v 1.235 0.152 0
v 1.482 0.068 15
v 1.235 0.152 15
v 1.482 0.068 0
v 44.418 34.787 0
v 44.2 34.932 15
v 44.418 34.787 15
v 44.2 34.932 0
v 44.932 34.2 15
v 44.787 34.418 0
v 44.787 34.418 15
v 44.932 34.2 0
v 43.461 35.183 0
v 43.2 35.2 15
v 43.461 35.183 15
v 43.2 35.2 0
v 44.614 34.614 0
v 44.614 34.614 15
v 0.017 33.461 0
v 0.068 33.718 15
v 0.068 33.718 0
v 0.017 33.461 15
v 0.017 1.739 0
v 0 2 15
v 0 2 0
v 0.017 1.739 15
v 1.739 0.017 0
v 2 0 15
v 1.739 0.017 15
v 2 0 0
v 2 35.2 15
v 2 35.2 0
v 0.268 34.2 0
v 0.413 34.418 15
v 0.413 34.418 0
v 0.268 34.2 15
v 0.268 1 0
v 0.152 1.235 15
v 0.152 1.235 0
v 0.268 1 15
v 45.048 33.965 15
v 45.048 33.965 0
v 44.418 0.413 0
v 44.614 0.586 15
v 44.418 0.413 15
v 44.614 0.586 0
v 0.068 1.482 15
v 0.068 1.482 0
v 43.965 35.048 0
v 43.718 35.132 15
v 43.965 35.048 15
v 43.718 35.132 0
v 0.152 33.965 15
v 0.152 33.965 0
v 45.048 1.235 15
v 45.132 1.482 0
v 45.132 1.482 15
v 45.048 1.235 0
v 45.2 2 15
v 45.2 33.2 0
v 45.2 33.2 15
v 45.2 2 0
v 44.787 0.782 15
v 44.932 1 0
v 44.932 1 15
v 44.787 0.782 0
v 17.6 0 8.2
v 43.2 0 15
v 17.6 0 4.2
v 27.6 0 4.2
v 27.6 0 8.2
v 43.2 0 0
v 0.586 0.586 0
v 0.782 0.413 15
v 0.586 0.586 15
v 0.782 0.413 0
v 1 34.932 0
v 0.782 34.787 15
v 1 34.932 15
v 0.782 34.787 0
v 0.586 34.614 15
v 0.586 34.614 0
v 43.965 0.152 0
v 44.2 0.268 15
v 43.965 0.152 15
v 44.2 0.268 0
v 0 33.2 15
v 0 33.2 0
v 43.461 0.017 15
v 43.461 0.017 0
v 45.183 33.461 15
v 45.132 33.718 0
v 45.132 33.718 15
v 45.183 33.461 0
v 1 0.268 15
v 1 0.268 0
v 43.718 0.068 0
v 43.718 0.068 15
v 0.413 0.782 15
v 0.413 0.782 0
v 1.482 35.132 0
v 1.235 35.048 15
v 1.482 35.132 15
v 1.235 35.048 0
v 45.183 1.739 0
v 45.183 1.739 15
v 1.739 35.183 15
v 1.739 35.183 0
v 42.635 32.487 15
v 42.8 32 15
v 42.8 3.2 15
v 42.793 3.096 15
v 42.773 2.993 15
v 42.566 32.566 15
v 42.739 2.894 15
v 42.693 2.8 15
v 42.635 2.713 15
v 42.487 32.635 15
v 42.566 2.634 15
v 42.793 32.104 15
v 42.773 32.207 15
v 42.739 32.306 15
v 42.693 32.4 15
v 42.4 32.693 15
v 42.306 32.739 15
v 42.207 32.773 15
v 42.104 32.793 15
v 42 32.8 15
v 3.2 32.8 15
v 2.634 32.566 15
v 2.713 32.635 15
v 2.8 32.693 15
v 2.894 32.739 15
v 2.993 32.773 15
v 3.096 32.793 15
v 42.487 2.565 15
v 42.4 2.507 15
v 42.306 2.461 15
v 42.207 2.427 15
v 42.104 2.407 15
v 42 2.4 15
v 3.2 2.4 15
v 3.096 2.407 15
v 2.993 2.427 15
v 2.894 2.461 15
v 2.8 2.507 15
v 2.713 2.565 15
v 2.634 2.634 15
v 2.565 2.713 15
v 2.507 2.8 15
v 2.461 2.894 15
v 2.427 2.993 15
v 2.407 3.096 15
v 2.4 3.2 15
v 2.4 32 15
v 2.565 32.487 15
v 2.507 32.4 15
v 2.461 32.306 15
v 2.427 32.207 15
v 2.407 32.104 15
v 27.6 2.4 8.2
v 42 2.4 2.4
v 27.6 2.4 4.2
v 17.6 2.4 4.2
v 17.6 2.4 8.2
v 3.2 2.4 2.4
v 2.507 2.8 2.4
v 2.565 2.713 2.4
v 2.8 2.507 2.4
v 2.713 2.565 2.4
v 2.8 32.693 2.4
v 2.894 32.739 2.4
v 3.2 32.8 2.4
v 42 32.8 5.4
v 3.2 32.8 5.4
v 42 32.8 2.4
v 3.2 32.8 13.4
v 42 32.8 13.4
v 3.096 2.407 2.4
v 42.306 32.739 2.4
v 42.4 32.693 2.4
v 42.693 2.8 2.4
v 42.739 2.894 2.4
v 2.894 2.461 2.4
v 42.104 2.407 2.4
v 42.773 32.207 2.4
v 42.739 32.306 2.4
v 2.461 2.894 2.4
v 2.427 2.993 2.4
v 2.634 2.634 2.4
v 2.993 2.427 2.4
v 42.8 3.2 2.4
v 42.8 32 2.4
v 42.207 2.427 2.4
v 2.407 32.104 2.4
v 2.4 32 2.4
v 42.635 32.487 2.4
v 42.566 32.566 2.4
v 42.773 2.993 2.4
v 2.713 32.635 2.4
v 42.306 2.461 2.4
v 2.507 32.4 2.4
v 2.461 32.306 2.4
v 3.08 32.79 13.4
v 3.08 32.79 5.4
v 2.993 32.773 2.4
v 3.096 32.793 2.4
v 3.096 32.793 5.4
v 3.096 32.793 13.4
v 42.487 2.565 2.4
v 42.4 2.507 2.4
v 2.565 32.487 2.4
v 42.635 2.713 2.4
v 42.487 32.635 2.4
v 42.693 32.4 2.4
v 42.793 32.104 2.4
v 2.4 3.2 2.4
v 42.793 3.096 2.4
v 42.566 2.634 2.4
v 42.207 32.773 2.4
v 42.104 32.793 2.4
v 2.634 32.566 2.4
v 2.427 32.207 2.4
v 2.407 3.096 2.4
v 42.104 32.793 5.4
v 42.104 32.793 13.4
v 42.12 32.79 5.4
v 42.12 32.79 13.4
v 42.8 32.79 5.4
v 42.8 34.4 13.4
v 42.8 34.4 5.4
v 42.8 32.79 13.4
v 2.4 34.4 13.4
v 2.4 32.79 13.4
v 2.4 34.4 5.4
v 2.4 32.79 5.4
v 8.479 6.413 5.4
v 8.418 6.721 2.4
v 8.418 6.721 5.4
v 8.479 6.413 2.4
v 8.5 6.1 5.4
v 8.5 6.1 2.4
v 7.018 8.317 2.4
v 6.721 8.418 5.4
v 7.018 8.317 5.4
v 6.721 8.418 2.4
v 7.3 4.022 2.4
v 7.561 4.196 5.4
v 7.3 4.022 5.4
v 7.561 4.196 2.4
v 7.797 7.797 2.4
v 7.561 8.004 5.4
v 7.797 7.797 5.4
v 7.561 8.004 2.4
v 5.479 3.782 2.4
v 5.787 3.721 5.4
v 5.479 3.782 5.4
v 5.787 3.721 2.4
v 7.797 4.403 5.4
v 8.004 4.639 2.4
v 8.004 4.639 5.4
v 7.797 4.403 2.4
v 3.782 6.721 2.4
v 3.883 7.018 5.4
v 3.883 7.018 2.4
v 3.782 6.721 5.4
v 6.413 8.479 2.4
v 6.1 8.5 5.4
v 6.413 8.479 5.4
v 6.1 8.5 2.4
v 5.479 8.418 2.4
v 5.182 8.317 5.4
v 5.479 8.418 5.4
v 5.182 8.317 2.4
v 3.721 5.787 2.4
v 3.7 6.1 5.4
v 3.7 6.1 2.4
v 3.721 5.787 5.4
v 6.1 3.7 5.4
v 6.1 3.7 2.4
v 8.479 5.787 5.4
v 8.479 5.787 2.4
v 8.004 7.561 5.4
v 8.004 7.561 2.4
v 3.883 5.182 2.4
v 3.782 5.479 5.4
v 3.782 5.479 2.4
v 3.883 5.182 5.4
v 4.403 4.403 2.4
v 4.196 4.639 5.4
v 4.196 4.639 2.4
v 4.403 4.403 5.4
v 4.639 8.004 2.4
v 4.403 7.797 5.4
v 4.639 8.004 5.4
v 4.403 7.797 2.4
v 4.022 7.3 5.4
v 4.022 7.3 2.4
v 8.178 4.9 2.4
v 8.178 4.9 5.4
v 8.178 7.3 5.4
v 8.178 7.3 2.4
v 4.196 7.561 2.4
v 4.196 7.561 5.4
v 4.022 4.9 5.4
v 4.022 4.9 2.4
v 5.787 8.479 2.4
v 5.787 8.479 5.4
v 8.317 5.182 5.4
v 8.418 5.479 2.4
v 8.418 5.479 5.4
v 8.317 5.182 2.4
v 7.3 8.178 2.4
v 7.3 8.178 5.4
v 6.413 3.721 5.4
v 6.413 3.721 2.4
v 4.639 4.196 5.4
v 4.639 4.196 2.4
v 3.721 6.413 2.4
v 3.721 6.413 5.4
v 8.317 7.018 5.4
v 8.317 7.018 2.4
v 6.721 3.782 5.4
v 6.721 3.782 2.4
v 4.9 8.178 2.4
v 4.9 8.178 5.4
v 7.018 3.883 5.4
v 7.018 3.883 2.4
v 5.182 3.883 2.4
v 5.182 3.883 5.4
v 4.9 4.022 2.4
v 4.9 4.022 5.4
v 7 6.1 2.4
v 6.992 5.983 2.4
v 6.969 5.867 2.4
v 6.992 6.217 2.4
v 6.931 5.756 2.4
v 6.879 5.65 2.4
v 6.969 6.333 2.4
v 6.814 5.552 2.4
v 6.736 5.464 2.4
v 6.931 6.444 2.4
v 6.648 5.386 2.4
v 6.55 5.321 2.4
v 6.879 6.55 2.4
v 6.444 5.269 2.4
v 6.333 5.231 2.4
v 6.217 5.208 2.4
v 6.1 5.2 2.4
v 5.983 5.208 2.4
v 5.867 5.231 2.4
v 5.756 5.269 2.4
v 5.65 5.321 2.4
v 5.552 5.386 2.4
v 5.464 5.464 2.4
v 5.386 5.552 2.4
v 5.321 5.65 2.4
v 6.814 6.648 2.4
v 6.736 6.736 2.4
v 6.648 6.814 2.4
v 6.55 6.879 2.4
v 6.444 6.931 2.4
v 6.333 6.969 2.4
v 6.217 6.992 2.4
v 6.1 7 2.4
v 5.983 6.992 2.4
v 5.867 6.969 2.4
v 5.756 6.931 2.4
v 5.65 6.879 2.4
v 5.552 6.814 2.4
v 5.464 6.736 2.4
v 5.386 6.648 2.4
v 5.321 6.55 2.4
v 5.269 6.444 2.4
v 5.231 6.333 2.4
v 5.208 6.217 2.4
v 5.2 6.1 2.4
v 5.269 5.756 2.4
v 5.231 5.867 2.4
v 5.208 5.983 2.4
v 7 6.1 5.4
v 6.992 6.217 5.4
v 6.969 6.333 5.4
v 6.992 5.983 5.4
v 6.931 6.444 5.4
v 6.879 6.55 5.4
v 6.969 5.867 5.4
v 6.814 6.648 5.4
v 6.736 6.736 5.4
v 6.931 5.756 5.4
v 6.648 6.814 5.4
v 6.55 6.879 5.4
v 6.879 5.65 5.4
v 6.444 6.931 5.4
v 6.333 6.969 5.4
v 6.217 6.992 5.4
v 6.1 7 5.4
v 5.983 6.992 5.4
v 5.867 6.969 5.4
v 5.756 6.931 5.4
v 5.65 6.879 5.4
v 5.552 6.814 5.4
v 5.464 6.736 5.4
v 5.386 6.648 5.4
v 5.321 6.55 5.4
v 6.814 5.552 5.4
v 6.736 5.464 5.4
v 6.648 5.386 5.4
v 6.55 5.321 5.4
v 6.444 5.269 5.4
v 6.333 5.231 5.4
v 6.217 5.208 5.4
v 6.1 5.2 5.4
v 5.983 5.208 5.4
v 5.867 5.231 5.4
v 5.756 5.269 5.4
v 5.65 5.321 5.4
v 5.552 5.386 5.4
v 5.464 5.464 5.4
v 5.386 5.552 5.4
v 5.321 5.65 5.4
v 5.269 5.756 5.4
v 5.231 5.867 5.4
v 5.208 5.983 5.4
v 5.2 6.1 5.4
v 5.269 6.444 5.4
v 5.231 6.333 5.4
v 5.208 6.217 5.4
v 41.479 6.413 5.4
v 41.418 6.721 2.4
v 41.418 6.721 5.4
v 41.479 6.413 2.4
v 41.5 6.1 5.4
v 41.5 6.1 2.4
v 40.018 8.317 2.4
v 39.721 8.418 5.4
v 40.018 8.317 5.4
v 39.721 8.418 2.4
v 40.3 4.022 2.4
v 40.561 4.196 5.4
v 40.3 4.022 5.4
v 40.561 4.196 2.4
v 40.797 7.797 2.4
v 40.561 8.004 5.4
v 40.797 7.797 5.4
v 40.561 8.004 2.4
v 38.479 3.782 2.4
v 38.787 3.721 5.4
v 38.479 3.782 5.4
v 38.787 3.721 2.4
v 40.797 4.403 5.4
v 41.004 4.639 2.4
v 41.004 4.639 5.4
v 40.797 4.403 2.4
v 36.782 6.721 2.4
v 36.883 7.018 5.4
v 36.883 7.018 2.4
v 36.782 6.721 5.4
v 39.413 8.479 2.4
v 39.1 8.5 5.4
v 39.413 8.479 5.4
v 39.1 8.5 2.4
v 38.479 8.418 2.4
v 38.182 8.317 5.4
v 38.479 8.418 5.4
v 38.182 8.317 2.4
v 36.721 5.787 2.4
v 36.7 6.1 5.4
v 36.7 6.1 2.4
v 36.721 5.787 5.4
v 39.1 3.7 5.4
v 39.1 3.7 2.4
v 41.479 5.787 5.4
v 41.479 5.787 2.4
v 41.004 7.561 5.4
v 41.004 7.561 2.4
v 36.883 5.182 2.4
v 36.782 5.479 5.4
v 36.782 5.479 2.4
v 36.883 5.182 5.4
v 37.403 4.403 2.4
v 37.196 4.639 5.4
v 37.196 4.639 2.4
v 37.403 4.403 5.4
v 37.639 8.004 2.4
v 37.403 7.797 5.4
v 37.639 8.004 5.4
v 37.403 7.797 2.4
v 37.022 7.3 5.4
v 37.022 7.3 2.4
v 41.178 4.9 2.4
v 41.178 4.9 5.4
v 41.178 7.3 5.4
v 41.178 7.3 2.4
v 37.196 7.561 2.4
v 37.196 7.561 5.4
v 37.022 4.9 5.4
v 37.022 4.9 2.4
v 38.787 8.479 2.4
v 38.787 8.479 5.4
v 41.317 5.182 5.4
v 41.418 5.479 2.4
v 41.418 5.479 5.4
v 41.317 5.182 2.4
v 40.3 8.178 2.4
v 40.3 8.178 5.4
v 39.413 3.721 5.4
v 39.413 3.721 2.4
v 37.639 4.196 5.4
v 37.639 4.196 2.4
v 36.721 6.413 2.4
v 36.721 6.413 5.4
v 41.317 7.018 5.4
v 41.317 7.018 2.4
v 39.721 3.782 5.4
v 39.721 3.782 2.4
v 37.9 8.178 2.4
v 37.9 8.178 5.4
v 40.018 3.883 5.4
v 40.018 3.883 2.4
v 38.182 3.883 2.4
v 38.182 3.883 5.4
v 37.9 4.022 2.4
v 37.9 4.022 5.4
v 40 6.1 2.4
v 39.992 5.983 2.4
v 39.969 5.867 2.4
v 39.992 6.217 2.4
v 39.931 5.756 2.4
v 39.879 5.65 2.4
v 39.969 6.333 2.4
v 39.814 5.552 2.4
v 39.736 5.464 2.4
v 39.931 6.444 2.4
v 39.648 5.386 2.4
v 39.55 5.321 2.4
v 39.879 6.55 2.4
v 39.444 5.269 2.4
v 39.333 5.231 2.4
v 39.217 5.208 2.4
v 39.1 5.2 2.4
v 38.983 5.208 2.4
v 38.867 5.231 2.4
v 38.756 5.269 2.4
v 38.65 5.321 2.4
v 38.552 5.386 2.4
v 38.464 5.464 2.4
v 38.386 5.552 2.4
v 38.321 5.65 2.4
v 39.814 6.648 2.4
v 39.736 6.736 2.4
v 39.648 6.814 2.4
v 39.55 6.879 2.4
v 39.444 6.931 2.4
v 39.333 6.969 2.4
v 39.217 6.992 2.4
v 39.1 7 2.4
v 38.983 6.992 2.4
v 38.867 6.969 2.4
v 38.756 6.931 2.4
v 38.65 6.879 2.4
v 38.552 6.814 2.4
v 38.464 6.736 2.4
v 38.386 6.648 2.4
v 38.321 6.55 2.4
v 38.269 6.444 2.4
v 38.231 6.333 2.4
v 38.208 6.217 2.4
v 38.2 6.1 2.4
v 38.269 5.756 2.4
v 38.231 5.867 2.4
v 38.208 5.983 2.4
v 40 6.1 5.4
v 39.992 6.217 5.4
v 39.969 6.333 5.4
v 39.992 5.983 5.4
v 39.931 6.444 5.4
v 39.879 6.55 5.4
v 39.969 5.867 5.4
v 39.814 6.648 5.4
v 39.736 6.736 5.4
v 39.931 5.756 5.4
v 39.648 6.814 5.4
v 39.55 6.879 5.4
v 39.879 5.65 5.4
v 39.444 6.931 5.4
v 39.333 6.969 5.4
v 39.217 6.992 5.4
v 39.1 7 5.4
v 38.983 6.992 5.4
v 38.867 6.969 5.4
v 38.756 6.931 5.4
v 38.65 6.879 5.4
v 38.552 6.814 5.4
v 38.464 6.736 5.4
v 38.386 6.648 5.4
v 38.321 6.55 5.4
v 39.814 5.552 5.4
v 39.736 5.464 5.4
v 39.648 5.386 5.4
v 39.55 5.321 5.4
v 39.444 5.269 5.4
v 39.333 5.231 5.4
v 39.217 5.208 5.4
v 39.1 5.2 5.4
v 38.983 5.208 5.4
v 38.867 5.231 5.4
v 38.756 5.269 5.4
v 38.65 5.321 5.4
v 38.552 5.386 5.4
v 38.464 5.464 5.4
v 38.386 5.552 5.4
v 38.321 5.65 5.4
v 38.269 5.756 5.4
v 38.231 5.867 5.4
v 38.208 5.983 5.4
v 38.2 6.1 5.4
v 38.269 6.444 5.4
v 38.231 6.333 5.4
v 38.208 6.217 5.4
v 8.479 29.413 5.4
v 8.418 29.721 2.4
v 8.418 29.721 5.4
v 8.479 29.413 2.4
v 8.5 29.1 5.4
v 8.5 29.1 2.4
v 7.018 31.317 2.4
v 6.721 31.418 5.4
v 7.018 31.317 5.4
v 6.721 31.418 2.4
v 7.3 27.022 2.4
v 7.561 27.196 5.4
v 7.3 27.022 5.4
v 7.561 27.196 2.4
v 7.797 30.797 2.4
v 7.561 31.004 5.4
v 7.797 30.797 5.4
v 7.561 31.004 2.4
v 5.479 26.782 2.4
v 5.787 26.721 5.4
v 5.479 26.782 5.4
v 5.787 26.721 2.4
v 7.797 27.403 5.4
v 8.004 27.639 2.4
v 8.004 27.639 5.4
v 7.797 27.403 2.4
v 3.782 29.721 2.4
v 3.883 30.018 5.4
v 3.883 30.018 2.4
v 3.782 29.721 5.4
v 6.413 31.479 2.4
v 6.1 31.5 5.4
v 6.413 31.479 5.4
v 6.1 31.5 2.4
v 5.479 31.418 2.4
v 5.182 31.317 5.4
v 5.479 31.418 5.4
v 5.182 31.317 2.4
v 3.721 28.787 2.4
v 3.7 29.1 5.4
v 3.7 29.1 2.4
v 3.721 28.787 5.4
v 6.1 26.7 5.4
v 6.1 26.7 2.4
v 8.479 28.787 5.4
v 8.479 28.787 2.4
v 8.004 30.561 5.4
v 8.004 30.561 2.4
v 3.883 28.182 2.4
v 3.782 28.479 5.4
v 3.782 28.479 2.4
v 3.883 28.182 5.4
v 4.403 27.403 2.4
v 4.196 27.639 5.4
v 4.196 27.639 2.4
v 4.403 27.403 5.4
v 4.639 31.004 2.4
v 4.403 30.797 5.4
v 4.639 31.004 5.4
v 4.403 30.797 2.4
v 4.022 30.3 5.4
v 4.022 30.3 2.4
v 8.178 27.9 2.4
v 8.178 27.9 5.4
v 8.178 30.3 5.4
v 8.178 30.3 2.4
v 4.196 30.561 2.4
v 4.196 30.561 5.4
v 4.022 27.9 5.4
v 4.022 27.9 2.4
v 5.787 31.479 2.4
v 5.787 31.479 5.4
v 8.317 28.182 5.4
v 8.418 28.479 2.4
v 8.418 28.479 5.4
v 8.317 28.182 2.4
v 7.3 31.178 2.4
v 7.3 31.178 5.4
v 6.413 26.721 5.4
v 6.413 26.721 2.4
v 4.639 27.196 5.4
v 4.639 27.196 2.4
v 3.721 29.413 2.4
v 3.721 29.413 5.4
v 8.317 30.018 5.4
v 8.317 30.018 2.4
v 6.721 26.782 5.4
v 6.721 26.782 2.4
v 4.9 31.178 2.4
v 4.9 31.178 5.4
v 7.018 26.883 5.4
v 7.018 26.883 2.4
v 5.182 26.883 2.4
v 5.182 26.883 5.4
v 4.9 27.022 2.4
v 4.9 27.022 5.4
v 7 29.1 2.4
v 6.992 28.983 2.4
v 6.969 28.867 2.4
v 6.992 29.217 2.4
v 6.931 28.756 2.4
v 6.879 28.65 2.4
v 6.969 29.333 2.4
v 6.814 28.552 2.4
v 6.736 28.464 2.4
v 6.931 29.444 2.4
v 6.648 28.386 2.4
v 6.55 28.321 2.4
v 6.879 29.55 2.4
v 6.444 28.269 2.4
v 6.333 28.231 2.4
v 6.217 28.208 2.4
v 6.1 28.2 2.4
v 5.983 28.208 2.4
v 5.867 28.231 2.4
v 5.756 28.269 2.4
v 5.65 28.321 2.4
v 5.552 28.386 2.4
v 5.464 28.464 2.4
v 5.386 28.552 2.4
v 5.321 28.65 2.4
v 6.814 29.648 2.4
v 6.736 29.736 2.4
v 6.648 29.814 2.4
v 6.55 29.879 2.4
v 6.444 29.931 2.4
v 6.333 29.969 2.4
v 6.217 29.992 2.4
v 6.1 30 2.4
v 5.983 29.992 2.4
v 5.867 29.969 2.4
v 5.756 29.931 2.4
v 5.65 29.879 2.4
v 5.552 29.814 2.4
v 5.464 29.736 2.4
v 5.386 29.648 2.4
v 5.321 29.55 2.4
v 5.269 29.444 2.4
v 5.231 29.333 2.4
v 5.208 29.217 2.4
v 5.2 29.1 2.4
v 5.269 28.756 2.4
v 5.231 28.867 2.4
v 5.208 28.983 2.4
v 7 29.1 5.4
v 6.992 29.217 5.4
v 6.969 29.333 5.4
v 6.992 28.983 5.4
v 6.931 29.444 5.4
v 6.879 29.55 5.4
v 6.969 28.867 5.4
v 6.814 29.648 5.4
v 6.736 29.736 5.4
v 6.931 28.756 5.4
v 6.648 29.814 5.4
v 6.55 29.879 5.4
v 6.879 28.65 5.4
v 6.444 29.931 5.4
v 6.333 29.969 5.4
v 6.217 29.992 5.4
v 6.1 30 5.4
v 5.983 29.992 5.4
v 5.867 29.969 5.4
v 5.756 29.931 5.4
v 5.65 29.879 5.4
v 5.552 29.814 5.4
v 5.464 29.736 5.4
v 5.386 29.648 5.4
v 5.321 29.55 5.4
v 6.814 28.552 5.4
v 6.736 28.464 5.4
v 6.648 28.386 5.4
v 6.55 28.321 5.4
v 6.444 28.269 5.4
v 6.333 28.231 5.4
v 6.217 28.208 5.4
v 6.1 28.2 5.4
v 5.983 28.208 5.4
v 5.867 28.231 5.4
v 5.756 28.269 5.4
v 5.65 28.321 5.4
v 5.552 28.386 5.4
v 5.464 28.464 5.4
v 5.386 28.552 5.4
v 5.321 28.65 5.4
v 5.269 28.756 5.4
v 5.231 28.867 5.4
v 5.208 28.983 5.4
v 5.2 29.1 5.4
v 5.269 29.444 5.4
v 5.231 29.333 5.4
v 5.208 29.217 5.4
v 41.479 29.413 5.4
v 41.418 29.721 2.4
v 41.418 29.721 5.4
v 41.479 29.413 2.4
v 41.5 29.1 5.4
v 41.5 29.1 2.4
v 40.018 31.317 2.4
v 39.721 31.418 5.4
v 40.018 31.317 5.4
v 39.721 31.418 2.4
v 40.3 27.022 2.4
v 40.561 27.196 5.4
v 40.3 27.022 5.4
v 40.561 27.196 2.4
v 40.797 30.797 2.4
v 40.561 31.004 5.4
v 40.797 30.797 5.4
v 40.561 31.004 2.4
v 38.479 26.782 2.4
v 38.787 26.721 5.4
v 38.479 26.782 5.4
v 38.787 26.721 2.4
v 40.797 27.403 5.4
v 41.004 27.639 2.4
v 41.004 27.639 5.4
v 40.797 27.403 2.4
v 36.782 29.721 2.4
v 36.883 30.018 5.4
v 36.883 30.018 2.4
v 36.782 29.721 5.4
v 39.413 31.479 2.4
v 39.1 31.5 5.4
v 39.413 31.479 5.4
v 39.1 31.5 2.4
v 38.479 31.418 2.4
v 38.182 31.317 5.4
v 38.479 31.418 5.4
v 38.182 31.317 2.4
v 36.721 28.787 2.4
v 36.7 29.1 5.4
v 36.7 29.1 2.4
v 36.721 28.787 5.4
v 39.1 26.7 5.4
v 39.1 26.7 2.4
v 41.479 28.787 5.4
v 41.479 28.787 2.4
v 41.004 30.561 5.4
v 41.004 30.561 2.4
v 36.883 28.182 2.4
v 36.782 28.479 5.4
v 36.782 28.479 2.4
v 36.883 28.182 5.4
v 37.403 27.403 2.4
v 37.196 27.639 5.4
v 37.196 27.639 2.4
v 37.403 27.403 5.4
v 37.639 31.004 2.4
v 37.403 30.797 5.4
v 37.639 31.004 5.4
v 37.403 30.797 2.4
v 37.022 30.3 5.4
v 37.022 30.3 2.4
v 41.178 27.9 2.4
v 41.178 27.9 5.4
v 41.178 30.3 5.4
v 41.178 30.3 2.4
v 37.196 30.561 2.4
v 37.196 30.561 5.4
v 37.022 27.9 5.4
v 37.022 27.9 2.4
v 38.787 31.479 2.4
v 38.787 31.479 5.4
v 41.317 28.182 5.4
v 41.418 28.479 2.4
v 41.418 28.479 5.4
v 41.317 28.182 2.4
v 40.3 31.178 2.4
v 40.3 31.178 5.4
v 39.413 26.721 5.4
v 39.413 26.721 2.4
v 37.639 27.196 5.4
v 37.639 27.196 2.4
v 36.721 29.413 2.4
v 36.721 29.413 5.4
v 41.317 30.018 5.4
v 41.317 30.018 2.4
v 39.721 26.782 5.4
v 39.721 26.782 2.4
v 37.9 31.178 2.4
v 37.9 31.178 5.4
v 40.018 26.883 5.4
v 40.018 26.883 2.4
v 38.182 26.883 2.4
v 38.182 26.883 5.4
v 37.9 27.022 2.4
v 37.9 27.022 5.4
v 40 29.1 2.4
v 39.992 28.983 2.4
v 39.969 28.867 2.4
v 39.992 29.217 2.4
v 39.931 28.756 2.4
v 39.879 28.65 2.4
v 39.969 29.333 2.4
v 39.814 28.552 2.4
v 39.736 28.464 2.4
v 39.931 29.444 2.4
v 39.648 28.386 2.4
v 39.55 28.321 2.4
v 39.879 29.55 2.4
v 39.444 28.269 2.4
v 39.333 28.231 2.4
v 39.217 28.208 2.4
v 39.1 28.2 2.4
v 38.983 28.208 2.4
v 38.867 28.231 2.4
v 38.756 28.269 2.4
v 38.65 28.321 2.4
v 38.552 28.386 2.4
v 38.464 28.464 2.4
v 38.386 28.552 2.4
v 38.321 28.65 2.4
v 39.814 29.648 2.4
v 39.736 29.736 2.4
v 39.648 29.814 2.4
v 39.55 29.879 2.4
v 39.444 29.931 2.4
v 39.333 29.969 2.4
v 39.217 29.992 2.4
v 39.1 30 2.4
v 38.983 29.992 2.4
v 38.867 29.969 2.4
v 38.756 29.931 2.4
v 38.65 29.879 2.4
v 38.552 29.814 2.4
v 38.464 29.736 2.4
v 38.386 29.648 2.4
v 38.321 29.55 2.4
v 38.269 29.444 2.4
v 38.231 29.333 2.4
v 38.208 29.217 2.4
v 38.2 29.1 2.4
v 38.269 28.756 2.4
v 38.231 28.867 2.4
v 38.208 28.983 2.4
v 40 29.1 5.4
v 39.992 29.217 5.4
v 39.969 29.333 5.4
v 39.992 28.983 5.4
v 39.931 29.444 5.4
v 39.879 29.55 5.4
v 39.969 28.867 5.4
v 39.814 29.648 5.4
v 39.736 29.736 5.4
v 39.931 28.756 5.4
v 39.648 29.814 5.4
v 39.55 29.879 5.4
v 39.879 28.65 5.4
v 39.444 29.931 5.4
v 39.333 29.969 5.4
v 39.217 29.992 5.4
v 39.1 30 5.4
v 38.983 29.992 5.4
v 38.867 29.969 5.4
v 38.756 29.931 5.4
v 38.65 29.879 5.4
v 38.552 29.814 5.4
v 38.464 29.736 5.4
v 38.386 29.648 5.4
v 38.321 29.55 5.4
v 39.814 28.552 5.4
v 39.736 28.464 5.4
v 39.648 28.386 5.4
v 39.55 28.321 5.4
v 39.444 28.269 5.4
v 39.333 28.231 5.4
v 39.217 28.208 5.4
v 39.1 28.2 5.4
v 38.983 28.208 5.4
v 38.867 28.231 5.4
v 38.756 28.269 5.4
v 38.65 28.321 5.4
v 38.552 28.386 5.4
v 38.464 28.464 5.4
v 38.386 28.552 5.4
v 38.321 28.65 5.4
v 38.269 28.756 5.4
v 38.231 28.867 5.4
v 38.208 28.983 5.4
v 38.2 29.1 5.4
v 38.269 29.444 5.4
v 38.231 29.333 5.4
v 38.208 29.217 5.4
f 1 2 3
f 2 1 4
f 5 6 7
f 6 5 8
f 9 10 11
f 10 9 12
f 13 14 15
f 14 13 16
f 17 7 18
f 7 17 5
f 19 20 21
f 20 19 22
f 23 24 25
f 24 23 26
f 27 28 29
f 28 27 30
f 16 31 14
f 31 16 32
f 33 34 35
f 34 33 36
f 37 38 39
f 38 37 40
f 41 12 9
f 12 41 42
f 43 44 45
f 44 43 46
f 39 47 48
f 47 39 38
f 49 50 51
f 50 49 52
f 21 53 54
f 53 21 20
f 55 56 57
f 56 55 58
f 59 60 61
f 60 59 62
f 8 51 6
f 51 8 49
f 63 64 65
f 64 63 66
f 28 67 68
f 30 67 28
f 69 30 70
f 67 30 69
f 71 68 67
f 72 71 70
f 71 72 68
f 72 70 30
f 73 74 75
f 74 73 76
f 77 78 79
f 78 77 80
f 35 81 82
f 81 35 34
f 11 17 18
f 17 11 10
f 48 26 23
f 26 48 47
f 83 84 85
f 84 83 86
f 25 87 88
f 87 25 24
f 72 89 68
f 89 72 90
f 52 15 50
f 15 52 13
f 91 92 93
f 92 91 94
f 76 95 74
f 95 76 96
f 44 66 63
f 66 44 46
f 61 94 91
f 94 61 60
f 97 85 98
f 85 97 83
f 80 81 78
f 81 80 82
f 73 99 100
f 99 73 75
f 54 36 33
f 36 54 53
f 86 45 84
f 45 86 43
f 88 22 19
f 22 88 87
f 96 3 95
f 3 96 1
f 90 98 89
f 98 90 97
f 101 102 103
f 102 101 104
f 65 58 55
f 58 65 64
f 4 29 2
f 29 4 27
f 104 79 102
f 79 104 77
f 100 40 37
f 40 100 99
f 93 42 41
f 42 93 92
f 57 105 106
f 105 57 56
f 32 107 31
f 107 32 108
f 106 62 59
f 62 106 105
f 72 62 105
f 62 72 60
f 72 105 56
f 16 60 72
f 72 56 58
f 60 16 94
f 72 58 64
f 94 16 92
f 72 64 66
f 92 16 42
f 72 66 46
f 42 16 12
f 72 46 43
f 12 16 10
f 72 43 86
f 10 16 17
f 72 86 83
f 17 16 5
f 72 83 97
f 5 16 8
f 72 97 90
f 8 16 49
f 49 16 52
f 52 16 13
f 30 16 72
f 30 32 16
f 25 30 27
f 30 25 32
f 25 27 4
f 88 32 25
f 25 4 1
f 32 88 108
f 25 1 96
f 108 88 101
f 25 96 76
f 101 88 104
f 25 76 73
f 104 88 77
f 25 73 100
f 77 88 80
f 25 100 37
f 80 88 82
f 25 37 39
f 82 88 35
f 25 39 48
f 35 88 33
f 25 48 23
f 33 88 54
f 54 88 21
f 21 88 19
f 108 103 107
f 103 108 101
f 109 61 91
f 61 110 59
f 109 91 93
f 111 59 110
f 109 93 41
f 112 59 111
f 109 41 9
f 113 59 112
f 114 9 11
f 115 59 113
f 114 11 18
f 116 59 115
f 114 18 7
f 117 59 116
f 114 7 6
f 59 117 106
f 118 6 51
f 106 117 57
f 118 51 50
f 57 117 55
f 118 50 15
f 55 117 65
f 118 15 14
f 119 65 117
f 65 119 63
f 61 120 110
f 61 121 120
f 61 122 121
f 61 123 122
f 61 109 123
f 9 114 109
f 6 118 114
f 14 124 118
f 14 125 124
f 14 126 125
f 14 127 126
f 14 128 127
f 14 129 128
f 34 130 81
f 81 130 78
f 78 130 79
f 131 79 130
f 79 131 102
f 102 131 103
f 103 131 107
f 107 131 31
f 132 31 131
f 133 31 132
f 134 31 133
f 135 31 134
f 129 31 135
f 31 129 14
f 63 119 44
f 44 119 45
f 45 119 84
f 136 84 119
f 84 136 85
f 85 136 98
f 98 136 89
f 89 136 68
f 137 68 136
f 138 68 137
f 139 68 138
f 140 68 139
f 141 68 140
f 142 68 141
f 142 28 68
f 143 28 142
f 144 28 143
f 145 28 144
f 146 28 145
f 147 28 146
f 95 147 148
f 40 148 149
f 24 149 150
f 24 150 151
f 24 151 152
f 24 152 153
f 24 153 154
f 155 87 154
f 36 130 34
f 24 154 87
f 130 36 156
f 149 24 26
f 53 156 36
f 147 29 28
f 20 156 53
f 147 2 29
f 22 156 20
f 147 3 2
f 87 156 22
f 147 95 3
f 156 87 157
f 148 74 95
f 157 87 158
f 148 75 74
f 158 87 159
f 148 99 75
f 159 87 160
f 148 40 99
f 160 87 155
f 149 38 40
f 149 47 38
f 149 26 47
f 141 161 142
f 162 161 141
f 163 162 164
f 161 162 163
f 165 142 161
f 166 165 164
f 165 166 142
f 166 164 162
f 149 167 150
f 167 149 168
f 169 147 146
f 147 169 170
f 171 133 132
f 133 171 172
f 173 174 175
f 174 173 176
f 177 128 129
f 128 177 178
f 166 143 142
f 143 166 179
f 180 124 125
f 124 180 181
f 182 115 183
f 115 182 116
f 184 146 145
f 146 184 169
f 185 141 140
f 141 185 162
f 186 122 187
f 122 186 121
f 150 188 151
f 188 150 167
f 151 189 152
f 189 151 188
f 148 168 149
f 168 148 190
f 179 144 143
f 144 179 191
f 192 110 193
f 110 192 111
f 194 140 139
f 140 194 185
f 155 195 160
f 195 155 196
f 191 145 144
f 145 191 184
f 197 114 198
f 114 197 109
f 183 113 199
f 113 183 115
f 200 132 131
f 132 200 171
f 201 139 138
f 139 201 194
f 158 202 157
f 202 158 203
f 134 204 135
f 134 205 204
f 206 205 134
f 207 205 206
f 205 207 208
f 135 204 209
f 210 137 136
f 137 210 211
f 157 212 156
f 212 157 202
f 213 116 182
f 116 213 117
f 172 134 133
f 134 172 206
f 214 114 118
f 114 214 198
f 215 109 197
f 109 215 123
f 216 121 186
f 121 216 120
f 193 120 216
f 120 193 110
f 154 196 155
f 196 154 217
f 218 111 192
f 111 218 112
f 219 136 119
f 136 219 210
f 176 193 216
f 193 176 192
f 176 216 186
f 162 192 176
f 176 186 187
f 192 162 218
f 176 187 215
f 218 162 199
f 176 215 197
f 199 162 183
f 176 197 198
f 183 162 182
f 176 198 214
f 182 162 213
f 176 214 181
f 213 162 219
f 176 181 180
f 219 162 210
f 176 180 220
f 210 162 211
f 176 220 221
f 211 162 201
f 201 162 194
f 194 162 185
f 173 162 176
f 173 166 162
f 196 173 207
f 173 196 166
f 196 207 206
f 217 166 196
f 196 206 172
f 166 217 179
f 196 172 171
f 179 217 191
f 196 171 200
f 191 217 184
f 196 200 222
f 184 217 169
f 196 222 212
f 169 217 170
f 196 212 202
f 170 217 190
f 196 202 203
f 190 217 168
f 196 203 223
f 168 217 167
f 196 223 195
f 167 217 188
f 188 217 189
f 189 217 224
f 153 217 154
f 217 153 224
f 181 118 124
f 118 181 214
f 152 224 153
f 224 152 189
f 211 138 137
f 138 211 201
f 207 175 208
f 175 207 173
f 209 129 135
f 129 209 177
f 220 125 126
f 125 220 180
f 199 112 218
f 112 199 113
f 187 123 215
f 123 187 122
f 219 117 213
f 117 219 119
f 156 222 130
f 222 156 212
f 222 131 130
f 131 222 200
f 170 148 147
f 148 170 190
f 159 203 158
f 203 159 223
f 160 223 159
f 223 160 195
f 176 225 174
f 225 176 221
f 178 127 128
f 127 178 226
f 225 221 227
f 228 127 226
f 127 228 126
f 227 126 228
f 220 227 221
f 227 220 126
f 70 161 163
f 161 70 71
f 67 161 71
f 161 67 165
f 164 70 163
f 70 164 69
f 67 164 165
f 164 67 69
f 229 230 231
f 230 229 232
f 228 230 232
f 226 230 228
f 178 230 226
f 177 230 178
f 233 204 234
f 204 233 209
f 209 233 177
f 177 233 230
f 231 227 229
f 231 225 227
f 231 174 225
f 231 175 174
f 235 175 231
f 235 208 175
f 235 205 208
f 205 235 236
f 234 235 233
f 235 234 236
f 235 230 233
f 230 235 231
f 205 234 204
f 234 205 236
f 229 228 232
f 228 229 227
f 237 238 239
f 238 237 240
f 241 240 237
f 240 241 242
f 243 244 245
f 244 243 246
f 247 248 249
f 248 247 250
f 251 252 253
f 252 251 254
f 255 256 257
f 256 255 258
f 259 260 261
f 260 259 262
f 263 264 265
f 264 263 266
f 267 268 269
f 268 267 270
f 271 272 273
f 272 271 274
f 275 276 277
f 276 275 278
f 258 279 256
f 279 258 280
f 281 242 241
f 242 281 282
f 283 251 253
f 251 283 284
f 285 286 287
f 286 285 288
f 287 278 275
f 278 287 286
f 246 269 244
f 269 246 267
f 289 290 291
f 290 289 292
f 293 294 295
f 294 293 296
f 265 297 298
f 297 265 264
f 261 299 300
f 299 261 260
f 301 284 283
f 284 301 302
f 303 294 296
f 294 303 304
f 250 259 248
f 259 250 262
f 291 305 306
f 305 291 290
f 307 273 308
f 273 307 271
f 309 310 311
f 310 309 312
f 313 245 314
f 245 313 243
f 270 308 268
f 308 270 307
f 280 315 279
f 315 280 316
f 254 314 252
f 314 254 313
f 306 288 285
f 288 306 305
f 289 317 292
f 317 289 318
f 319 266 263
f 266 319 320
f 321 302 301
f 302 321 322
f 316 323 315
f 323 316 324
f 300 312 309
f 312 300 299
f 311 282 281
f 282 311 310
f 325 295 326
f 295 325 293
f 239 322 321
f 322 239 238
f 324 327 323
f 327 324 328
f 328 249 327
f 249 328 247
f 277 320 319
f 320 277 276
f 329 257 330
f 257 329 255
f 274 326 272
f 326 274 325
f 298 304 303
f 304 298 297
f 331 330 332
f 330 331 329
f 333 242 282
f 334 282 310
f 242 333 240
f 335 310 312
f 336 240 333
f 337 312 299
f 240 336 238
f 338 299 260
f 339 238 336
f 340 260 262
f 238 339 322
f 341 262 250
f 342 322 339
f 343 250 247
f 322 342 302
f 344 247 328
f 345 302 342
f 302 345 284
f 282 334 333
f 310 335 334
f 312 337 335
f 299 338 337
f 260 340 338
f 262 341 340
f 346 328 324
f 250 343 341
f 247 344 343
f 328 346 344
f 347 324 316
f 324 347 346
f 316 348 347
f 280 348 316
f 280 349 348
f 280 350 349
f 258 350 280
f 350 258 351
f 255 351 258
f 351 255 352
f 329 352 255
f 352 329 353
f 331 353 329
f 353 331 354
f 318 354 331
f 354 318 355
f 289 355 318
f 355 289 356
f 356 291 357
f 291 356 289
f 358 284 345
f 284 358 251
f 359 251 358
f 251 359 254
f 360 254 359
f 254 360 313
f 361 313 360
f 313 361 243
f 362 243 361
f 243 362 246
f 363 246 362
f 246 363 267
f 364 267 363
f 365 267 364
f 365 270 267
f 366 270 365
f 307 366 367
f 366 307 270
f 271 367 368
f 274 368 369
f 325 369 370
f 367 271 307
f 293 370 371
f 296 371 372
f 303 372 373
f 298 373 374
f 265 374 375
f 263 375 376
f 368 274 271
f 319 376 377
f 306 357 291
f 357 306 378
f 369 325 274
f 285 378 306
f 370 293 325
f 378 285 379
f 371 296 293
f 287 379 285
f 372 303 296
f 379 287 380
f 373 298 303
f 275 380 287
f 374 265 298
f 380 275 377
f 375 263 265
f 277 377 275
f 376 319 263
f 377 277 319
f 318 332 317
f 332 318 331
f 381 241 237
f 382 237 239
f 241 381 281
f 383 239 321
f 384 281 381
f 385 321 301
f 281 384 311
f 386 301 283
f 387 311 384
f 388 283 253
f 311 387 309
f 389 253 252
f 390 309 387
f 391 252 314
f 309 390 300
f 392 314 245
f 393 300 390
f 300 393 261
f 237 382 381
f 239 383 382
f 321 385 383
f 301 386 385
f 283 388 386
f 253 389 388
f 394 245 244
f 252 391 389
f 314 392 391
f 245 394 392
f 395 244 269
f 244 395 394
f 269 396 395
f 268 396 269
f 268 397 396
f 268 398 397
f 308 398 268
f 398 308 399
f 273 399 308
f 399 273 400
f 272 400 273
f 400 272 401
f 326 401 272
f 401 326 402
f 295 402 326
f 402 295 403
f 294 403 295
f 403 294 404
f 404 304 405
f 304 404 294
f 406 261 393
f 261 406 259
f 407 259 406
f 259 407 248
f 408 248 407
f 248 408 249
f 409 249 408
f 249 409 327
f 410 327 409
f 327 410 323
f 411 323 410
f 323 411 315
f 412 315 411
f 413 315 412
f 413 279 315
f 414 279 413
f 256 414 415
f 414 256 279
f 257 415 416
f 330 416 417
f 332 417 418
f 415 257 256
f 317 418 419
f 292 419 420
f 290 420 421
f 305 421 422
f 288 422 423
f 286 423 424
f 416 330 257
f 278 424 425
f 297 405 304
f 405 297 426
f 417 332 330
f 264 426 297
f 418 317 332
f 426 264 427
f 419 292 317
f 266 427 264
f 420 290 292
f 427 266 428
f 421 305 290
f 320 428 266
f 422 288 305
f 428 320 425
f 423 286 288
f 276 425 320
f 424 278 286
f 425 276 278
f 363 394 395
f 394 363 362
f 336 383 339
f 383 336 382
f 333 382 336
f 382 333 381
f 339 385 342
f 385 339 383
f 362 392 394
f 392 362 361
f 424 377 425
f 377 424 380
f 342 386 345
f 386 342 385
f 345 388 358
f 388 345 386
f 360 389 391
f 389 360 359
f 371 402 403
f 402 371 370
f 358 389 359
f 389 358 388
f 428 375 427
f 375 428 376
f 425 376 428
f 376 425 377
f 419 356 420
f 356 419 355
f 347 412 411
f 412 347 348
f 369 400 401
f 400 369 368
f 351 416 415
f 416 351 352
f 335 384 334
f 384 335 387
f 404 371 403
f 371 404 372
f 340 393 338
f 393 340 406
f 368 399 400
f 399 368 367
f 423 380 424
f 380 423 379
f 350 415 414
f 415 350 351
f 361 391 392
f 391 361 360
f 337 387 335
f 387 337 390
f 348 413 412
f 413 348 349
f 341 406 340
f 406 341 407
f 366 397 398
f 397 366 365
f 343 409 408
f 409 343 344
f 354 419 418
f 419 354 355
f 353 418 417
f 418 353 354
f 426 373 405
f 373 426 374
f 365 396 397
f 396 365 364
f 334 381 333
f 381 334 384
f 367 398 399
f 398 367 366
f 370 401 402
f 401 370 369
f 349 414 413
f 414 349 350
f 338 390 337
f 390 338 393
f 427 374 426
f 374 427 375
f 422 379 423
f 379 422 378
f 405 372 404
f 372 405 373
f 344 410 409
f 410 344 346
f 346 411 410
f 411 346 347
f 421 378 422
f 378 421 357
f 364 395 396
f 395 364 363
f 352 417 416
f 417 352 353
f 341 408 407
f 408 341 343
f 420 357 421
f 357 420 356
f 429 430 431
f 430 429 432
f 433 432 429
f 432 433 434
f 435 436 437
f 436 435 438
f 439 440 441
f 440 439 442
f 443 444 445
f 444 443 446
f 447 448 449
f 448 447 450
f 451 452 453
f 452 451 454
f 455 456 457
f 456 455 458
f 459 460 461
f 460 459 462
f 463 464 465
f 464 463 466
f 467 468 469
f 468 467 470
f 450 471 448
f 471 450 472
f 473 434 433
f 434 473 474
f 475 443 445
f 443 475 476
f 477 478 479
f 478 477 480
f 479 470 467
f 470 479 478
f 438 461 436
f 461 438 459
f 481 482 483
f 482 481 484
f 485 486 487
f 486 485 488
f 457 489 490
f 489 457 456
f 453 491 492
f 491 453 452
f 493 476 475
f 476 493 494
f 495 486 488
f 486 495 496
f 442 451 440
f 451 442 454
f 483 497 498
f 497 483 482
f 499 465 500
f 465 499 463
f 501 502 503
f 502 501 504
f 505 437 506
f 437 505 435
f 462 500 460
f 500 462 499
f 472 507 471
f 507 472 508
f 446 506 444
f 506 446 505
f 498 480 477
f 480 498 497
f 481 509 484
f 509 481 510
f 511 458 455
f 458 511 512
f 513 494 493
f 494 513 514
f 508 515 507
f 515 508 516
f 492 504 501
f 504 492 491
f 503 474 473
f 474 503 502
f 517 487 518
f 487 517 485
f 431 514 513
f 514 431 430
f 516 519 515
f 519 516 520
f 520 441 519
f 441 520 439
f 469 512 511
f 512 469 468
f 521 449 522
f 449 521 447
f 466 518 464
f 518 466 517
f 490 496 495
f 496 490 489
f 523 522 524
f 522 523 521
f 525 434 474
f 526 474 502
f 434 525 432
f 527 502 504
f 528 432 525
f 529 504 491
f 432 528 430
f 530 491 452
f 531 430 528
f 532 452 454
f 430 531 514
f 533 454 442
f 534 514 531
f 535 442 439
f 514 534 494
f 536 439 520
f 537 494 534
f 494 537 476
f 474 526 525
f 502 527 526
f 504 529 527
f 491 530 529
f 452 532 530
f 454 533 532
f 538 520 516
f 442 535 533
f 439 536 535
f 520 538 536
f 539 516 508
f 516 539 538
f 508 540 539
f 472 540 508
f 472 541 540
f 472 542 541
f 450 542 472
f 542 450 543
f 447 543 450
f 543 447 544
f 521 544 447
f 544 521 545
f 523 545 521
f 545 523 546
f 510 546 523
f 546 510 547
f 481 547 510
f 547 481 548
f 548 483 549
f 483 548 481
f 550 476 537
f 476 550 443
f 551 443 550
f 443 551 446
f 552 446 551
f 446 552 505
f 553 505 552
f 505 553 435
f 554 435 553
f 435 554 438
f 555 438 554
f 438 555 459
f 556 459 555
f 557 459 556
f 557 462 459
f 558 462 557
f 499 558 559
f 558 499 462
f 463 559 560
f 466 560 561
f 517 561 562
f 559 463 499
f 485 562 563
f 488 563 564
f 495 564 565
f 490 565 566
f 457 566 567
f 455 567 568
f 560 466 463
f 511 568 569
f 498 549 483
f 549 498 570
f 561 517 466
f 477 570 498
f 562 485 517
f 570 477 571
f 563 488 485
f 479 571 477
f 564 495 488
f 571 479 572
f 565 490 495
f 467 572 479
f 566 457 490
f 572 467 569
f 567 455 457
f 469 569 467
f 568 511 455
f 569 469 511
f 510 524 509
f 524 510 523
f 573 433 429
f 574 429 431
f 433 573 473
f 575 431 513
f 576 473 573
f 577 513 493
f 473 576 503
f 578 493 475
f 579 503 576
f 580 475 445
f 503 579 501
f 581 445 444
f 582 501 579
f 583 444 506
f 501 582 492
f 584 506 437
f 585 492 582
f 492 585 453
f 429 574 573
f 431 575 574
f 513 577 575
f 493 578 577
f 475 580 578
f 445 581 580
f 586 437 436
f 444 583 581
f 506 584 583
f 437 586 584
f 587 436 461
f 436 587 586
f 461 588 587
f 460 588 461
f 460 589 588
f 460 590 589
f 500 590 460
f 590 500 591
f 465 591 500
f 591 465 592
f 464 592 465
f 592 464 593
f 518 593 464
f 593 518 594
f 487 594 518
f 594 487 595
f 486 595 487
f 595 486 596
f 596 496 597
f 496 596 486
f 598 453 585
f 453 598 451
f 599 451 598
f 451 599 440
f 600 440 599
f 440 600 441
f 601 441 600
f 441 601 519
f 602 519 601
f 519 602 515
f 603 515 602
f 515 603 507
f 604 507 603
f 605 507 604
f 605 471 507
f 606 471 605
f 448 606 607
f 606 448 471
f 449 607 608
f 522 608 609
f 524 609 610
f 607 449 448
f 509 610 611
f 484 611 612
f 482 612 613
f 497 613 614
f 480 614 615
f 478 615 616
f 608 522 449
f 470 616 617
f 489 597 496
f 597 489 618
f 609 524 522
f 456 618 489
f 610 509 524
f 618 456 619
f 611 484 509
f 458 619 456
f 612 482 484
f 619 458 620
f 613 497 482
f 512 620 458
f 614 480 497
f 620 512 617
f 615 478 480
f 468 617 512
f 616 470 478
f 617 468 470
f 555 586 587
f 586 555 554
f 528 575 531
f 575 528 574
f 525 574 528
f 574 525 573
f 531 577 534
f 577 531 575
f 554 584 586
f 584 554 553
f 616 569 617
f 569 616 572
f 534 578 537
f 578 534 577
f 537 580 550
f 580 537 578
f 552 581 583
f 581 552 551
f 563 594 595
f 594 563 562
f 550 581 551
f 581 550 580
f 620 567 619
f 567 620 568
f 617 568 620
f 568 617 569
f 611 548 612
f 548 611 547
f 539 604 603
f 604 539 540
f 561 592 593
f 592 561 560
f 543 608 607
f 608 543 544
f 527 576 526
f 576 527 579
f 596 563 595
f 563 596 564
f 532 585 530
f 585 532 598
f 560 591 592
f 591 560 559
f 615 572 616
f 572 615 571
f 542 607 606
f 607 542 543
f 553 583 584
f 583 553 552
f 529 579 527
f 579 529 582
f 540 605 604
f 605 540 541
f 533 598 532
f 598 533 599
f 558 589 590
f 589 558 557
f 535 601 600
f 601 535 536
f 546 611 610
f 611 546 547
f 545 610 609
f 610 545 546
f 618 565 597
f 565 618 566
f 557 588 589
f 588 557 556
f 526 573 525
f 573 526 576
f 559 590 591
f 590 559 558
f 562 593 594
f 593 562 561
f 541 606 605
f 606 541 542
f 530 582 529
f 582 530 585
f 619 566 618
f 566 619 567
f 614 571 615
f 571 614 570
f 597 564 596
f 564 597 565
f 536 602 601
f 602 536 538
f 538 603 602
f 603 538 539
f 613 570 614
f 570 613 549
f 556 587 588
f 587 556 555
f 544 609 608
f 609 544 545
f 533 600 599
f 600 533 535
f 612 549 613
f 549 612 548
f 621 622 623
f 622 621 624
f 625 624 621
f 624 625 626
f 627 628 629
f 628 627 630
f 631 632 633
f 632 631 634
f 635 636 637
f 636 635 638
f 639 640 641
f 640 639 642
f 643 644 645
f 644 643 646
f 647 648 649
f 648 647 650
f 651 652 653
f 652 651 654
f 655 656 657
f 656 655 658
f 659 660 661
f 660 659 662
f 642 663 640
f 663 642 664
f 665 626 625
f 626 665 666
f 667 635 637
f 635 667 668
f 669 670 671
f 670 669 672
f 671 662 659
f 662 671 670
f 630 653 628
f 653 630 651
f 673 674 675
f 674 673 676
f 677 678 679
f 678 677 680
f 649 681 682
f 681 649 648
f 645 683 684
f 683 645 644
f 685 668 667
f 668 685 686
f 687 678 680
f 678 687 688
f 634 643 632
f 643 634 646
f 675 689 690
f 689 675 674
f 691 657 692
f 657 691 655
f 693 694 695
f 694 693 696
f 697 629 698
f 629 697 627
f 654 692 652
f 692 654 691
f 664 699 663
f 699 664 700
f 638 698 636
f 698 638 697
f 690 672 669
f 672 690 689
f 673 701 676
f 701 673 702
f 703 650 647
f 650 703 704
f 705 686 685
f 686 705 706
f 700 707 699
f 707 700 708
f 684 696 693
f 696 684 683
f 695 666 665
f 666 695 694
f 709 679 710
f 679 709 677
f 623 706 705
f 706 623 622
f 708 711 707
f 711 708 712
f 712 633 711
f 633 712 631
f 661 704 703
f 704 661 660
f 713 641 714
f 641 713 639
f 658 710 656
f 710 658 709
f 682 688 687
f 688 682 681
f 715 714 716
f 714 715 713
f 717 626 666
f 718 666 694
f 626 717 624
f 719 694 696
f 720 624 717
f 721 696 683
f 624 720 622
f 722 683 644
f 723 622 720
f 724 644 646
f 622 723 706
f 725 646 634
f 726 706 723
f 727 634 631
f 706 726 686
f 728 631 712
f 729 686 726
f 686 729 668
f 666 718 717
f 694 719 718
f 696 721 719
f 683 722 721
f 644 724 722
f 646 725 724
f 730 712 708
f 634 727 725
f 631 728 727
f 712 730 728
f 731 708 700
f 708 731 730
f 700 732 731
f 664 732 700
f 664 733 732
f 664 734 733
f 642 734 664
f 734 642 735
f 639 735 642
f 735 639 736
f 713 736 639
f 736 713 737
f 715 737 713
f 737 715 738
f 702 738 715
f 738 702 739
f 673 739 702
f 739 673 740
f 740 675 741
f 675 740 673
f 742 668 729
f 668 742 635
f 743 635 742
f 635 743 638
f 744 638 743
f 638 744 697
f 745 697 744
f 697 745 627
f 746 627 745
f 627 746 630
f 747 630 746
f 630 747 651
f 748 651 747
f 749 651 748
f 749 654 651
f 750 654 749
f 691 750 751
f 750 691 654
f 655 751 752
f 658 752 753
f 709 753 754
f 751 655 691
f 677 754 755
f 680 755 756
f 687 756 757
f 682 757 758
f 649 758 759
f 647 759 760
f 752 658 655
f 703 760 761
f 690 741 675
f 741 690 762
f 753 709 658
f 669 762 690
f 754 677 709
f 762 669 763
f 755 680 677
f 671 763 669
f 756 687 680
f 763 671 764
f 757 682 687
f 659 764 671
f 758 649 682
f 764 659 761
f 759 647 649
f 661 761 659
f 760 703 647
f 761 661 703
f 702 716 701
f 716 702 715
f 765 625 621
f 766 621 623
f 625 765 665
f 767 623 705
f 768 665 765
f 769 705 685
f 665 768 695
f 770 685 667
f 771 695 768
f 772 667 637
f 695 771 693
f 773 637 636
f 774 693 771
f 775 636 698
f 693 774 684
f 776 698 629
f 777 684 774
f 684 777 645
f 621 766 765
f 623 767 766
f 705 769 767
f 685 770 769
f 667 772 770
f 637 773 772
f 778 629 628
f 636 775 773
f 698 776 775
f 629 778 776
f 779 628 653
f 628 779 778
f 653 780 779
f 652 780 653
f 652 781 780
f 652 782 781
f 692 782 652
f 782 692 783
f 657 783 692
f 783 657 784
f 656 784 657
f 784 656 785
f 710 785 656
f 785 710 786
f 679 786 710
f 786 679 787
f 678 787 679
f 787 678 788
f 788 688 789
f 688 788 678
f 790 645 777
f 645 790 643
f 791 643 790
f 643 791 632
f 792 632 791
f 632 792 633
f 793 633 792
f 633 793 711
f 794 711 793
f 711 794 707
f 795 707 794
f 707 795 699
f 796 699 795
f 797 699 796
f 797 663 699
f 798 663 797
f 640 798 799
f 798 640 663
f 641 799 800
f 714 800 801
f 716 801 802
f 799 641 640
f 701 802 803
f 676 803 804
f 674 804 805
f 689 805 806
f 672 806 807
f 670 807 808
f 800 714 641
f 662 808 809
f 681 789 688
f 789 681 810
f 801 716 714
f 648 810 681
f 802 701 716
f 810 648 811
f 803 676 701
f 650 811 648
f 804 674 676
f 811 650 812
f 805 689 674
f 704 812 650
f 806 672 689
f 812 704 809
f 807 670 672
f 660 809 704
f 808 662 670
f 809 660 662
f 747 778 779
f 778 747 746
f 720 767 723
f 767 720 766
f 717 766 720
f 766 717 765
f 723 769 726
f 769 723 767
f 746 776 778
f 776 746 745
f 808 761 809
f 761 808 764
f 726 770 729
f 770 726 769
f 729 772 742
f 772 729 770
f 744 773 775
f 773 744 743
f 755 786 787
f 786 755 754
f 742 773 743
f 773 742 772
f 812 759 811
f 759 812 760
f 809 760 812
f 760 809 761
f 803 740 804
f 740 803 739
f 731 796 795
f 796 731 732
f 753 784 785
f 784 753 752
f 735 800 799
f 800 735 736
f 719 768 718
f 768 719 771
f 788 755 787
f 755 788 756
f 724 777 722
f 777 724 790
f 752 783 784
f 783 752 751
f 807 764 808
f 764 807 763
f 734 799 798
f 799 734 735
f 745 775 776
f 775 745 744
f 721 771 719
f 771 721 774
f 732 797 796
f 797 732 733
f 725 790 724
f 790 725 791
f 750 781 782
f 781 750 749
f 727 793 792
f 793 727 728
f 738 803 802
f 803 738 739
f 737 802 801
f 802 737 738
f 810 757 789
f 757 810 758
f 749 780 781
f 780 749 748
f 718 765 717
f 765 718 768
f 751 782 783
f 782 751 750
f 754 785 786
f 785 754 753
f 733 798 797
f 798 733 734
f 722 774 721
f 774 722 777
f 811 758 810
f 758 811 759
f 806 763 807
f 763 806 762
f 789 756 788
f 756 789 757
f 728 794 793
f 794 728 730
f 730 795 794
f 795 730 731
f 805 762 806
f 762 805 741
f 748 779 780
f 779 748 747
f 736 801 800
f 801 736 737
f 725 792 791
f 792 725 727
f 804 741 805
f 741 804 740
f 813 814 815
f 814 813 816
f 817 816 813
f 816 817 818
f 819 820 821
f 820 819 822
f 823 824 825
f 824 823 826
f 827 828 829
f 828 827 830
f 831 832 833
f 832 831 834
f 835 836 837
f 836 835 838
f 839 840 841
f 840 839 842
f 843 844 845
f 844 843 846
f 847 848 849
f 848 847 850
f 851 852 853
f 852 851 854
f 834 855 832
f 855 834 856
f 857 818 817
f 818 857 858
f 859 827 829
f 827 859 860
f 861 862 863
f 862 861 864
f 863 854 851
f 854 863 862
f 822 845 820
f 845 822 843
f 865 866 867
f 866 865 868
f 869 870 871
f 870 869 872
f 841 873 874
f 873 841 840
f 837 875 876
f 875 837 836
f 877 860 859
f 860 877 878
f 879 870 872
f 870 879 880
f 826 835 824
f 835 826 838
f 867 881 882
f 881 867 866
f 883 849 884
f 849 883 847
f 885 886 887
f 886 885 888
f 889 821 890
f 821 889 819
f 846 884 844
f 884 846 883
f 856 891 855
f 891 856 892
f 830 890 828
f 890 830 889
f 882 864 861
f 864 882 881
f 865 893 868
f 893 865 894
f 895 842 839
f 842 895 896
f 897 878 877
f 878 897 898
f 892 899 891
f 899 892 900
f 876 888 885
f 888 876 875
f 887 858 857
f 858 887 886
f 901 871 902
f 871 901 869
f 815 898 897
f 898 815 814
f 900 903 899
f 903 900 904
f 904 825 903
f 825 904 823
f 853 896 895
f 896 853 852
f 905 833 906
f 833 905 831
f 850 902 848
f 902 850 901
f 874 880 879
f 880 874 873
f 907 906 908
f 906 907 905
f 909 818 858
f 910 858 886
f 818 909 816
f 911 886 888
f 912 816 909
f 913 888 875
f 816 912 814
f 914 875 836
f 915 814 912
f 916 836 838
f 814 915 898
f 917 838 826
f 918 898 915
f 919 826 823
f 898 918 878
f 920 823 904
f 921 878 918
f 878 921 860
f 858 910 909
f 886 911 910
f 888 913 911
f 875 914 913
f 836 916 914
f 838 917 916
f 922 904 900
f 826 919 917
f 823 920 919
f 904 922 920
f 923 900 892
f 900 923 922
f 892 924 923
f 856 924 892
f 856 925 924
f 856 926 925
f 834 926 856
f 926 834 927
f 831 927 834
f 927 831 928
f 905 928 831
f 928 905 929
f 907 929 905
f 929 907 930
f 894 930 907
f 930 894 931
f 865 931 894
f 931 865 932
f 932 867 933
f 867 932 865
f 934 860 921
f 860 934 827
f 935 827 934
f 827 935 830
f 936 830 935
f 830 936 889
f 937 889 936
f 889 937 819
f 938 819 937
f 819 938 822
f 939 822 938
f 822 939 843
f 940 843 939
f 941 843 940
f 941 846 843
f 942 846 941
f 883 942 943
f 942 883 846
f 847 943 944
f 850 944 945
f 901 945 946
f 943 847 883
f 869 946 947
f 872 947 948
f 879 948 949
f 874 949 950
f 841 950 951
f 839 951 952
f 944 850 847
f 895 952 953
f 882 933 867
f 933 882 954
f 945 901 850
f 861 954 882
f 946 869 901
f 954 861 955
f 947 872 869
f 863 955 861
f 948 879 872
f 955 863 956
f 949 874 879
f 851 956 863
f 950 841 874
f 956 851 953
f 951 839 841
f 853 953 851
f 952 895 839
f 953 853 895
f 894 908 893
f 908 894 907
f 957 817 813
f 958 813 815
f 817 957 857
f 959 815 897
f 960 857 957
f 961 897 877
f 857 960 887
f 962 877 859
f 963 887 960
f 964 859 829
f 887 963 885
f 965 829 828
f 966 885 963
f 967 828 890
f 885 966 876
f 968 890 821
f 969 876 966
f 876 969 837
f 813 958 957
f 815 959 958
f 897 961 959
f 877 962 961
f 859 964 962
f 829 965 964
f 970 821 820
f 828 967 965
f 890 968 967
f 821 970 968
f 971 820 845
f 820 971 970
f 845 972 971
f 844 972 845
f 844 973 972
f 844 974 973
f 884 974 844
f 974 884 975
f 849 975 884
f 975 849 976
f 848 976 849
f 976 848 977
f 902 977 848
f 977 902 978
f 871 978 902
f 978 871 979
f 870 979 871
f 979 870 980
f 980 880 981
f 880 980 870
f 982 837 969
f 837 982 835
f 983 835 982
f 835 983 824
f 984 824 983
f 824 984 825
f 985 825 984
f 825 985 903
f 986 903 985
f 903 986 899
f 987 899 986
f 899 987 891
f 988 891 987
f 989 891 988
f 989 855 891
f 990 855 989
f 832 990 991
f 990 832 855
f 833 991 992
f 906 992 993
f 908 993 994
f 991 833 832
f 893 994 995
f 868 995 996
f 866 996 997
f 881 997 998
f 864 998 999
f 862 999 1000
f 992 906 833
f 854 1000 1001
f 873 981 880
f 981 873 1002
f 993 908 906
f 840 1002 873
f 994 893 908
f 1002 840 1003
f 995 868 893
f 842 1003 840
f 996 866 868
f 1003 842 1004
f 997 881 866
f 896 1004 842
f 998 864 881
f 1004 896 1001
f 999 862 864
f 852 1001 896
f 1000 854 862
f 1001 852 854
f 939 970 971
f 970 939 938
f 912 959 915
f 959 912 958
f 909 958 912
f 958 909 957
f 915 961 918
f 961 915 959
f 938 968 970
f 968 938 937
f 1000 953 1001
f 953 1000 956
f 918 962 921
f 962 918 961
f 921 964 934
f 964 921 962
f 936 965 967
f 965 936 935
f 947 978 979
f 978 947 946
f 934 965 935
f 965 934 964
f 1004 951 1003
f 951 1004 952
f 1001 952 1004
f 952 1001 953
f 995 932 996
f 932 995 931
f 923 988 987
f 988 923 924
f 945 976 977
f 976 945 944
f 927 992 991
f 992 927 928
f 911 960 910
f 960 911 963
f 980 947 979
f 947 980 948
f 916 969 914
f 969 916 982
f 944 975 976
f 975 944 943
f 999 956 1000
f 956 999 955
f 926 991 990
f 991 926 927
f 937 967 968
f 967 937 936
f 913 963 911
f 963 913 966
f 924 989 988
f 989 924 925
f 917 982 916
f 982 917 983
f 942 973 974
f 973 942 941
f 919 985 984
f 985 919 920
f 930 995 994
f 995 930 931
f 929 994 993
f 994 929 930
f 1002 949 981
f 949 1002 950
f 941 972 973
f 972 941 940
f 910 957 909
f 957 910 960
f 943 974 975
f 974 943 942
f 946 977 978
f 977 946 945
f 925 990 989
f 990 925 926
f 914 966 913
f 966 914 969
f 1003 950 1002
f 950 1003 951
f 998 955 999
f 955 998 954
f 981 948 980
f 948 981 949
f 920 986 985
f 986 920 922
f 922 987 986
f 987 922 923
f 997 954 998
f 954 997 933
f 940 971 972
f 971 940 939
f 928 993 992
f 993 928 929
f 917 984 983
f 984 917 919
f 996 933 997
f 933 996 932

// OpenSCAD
// datum — a modular control-surface enclosure.
//
// A tray that carries one board, opens on one edge for USB-C, and thins over
// the antenna. Every dimension that depends on the board is a parameter, so
// the same file serves a different board by being called with different
// numbers rather than by being edited.
//
// House constants follow parts/footpedal/button.scad, per the datum project's
// record on enclosure parts: wall 2.4, tolerance 0.2, cap radius 2.
//
// SIGNAL ONLY. Nothing here is rated to sit between a person and a conductor.
// Where a module goes in a wall box, this part is cosmetic and mechanical and
// the listed box is the barrier. See the datum project's signal-only record.

// ---- board envelope (from the black box; defaults are the T1-Core stub) ----
board_w = 40.0;   // X
board_d = 30.0;   // Y
board_h = 1.6;    // Z, bare board
mount_inset = 3.5;
mount_hole = 2.2;

// ---- house constants -------------------------------------------------------
wall = 2.4;
tol = 0.2;
r_cap = 2.0;

// ---- fit --------------------------------------------------------------------
standoff = 3.0;   // board underside to floor: clearance for through-hole tails
headroom = 8.0;   // above the board: modules, connectors, a finger
usb_w = 10.0;     // USB-C opening width
usb_h = 4.0;      // USB-C opening height
antenna_band = 8.0;  // depth of the thinned strip at the antenna edge
antenna_wall = 0.8;  // thinned to stay out of the radio's way

inner_w = board_w + 2 * tol;
inner_d = board_d + 2 * tol;
inner_h = standoff + board_h + headroom;
outer_w = inner_w + 2 * wall;
outer_d = inner_d + 2 * wall;
outer_h = inner_h + wall;

$fn = 48;

module rounded_box(w, d, h, r) {
    hull() for (x = [r, w - r], y = [r, d - r])
        translate([x, y, 0]) cylinder(r = r, h = h);
}

module shell() {
    difference() {
        rounded_box(outer_w, outer_d, outer_h, r_cap);
        // cavity
        translate([wall, wall, wall])
            rounded_box(inner_w, inner_d, inner_h + 1, max(r_cap - wall / 2, 0.1));
        // USB-C opening, centred on the front edge (y = 0)
        translate([outer_w / 2 - usb_w / 2, -1, wall + standoff + board_h / 2 - usb_h / 2])
            cube([usb_w, wall + 2, usb_h]);
        // antenna relief: thin the back wall rather than removing it
        translate([wall, outer_d - wall - 0.01, wall + standoff])
            cube([inner_w, wall - antenna_wall + 0.01, antenna_band]);
    }
}

module standoffs() {
    for (p = [[mount_inset, mount_inset],
              [board_w - mount_inset, mount_inset],
              [mount_inset, board_d - mount_inset],
              [board_w - mount_inset, board_d - mount_inset]])
        translate([wall + tol + p[0], wall + tol + p[1], wall])
            difference() {
                cylinder(d = mount_hole + 2.6, h = standoff);
                // pilot for a self-tapping M2: undersized on purpose
                translate([0, 0, -0.5]) cylinder(d = mount_hole - 0.4, h = standoff + 1);
            }
}

module datum() {
    shell();
    standoffs();
}

datum();
